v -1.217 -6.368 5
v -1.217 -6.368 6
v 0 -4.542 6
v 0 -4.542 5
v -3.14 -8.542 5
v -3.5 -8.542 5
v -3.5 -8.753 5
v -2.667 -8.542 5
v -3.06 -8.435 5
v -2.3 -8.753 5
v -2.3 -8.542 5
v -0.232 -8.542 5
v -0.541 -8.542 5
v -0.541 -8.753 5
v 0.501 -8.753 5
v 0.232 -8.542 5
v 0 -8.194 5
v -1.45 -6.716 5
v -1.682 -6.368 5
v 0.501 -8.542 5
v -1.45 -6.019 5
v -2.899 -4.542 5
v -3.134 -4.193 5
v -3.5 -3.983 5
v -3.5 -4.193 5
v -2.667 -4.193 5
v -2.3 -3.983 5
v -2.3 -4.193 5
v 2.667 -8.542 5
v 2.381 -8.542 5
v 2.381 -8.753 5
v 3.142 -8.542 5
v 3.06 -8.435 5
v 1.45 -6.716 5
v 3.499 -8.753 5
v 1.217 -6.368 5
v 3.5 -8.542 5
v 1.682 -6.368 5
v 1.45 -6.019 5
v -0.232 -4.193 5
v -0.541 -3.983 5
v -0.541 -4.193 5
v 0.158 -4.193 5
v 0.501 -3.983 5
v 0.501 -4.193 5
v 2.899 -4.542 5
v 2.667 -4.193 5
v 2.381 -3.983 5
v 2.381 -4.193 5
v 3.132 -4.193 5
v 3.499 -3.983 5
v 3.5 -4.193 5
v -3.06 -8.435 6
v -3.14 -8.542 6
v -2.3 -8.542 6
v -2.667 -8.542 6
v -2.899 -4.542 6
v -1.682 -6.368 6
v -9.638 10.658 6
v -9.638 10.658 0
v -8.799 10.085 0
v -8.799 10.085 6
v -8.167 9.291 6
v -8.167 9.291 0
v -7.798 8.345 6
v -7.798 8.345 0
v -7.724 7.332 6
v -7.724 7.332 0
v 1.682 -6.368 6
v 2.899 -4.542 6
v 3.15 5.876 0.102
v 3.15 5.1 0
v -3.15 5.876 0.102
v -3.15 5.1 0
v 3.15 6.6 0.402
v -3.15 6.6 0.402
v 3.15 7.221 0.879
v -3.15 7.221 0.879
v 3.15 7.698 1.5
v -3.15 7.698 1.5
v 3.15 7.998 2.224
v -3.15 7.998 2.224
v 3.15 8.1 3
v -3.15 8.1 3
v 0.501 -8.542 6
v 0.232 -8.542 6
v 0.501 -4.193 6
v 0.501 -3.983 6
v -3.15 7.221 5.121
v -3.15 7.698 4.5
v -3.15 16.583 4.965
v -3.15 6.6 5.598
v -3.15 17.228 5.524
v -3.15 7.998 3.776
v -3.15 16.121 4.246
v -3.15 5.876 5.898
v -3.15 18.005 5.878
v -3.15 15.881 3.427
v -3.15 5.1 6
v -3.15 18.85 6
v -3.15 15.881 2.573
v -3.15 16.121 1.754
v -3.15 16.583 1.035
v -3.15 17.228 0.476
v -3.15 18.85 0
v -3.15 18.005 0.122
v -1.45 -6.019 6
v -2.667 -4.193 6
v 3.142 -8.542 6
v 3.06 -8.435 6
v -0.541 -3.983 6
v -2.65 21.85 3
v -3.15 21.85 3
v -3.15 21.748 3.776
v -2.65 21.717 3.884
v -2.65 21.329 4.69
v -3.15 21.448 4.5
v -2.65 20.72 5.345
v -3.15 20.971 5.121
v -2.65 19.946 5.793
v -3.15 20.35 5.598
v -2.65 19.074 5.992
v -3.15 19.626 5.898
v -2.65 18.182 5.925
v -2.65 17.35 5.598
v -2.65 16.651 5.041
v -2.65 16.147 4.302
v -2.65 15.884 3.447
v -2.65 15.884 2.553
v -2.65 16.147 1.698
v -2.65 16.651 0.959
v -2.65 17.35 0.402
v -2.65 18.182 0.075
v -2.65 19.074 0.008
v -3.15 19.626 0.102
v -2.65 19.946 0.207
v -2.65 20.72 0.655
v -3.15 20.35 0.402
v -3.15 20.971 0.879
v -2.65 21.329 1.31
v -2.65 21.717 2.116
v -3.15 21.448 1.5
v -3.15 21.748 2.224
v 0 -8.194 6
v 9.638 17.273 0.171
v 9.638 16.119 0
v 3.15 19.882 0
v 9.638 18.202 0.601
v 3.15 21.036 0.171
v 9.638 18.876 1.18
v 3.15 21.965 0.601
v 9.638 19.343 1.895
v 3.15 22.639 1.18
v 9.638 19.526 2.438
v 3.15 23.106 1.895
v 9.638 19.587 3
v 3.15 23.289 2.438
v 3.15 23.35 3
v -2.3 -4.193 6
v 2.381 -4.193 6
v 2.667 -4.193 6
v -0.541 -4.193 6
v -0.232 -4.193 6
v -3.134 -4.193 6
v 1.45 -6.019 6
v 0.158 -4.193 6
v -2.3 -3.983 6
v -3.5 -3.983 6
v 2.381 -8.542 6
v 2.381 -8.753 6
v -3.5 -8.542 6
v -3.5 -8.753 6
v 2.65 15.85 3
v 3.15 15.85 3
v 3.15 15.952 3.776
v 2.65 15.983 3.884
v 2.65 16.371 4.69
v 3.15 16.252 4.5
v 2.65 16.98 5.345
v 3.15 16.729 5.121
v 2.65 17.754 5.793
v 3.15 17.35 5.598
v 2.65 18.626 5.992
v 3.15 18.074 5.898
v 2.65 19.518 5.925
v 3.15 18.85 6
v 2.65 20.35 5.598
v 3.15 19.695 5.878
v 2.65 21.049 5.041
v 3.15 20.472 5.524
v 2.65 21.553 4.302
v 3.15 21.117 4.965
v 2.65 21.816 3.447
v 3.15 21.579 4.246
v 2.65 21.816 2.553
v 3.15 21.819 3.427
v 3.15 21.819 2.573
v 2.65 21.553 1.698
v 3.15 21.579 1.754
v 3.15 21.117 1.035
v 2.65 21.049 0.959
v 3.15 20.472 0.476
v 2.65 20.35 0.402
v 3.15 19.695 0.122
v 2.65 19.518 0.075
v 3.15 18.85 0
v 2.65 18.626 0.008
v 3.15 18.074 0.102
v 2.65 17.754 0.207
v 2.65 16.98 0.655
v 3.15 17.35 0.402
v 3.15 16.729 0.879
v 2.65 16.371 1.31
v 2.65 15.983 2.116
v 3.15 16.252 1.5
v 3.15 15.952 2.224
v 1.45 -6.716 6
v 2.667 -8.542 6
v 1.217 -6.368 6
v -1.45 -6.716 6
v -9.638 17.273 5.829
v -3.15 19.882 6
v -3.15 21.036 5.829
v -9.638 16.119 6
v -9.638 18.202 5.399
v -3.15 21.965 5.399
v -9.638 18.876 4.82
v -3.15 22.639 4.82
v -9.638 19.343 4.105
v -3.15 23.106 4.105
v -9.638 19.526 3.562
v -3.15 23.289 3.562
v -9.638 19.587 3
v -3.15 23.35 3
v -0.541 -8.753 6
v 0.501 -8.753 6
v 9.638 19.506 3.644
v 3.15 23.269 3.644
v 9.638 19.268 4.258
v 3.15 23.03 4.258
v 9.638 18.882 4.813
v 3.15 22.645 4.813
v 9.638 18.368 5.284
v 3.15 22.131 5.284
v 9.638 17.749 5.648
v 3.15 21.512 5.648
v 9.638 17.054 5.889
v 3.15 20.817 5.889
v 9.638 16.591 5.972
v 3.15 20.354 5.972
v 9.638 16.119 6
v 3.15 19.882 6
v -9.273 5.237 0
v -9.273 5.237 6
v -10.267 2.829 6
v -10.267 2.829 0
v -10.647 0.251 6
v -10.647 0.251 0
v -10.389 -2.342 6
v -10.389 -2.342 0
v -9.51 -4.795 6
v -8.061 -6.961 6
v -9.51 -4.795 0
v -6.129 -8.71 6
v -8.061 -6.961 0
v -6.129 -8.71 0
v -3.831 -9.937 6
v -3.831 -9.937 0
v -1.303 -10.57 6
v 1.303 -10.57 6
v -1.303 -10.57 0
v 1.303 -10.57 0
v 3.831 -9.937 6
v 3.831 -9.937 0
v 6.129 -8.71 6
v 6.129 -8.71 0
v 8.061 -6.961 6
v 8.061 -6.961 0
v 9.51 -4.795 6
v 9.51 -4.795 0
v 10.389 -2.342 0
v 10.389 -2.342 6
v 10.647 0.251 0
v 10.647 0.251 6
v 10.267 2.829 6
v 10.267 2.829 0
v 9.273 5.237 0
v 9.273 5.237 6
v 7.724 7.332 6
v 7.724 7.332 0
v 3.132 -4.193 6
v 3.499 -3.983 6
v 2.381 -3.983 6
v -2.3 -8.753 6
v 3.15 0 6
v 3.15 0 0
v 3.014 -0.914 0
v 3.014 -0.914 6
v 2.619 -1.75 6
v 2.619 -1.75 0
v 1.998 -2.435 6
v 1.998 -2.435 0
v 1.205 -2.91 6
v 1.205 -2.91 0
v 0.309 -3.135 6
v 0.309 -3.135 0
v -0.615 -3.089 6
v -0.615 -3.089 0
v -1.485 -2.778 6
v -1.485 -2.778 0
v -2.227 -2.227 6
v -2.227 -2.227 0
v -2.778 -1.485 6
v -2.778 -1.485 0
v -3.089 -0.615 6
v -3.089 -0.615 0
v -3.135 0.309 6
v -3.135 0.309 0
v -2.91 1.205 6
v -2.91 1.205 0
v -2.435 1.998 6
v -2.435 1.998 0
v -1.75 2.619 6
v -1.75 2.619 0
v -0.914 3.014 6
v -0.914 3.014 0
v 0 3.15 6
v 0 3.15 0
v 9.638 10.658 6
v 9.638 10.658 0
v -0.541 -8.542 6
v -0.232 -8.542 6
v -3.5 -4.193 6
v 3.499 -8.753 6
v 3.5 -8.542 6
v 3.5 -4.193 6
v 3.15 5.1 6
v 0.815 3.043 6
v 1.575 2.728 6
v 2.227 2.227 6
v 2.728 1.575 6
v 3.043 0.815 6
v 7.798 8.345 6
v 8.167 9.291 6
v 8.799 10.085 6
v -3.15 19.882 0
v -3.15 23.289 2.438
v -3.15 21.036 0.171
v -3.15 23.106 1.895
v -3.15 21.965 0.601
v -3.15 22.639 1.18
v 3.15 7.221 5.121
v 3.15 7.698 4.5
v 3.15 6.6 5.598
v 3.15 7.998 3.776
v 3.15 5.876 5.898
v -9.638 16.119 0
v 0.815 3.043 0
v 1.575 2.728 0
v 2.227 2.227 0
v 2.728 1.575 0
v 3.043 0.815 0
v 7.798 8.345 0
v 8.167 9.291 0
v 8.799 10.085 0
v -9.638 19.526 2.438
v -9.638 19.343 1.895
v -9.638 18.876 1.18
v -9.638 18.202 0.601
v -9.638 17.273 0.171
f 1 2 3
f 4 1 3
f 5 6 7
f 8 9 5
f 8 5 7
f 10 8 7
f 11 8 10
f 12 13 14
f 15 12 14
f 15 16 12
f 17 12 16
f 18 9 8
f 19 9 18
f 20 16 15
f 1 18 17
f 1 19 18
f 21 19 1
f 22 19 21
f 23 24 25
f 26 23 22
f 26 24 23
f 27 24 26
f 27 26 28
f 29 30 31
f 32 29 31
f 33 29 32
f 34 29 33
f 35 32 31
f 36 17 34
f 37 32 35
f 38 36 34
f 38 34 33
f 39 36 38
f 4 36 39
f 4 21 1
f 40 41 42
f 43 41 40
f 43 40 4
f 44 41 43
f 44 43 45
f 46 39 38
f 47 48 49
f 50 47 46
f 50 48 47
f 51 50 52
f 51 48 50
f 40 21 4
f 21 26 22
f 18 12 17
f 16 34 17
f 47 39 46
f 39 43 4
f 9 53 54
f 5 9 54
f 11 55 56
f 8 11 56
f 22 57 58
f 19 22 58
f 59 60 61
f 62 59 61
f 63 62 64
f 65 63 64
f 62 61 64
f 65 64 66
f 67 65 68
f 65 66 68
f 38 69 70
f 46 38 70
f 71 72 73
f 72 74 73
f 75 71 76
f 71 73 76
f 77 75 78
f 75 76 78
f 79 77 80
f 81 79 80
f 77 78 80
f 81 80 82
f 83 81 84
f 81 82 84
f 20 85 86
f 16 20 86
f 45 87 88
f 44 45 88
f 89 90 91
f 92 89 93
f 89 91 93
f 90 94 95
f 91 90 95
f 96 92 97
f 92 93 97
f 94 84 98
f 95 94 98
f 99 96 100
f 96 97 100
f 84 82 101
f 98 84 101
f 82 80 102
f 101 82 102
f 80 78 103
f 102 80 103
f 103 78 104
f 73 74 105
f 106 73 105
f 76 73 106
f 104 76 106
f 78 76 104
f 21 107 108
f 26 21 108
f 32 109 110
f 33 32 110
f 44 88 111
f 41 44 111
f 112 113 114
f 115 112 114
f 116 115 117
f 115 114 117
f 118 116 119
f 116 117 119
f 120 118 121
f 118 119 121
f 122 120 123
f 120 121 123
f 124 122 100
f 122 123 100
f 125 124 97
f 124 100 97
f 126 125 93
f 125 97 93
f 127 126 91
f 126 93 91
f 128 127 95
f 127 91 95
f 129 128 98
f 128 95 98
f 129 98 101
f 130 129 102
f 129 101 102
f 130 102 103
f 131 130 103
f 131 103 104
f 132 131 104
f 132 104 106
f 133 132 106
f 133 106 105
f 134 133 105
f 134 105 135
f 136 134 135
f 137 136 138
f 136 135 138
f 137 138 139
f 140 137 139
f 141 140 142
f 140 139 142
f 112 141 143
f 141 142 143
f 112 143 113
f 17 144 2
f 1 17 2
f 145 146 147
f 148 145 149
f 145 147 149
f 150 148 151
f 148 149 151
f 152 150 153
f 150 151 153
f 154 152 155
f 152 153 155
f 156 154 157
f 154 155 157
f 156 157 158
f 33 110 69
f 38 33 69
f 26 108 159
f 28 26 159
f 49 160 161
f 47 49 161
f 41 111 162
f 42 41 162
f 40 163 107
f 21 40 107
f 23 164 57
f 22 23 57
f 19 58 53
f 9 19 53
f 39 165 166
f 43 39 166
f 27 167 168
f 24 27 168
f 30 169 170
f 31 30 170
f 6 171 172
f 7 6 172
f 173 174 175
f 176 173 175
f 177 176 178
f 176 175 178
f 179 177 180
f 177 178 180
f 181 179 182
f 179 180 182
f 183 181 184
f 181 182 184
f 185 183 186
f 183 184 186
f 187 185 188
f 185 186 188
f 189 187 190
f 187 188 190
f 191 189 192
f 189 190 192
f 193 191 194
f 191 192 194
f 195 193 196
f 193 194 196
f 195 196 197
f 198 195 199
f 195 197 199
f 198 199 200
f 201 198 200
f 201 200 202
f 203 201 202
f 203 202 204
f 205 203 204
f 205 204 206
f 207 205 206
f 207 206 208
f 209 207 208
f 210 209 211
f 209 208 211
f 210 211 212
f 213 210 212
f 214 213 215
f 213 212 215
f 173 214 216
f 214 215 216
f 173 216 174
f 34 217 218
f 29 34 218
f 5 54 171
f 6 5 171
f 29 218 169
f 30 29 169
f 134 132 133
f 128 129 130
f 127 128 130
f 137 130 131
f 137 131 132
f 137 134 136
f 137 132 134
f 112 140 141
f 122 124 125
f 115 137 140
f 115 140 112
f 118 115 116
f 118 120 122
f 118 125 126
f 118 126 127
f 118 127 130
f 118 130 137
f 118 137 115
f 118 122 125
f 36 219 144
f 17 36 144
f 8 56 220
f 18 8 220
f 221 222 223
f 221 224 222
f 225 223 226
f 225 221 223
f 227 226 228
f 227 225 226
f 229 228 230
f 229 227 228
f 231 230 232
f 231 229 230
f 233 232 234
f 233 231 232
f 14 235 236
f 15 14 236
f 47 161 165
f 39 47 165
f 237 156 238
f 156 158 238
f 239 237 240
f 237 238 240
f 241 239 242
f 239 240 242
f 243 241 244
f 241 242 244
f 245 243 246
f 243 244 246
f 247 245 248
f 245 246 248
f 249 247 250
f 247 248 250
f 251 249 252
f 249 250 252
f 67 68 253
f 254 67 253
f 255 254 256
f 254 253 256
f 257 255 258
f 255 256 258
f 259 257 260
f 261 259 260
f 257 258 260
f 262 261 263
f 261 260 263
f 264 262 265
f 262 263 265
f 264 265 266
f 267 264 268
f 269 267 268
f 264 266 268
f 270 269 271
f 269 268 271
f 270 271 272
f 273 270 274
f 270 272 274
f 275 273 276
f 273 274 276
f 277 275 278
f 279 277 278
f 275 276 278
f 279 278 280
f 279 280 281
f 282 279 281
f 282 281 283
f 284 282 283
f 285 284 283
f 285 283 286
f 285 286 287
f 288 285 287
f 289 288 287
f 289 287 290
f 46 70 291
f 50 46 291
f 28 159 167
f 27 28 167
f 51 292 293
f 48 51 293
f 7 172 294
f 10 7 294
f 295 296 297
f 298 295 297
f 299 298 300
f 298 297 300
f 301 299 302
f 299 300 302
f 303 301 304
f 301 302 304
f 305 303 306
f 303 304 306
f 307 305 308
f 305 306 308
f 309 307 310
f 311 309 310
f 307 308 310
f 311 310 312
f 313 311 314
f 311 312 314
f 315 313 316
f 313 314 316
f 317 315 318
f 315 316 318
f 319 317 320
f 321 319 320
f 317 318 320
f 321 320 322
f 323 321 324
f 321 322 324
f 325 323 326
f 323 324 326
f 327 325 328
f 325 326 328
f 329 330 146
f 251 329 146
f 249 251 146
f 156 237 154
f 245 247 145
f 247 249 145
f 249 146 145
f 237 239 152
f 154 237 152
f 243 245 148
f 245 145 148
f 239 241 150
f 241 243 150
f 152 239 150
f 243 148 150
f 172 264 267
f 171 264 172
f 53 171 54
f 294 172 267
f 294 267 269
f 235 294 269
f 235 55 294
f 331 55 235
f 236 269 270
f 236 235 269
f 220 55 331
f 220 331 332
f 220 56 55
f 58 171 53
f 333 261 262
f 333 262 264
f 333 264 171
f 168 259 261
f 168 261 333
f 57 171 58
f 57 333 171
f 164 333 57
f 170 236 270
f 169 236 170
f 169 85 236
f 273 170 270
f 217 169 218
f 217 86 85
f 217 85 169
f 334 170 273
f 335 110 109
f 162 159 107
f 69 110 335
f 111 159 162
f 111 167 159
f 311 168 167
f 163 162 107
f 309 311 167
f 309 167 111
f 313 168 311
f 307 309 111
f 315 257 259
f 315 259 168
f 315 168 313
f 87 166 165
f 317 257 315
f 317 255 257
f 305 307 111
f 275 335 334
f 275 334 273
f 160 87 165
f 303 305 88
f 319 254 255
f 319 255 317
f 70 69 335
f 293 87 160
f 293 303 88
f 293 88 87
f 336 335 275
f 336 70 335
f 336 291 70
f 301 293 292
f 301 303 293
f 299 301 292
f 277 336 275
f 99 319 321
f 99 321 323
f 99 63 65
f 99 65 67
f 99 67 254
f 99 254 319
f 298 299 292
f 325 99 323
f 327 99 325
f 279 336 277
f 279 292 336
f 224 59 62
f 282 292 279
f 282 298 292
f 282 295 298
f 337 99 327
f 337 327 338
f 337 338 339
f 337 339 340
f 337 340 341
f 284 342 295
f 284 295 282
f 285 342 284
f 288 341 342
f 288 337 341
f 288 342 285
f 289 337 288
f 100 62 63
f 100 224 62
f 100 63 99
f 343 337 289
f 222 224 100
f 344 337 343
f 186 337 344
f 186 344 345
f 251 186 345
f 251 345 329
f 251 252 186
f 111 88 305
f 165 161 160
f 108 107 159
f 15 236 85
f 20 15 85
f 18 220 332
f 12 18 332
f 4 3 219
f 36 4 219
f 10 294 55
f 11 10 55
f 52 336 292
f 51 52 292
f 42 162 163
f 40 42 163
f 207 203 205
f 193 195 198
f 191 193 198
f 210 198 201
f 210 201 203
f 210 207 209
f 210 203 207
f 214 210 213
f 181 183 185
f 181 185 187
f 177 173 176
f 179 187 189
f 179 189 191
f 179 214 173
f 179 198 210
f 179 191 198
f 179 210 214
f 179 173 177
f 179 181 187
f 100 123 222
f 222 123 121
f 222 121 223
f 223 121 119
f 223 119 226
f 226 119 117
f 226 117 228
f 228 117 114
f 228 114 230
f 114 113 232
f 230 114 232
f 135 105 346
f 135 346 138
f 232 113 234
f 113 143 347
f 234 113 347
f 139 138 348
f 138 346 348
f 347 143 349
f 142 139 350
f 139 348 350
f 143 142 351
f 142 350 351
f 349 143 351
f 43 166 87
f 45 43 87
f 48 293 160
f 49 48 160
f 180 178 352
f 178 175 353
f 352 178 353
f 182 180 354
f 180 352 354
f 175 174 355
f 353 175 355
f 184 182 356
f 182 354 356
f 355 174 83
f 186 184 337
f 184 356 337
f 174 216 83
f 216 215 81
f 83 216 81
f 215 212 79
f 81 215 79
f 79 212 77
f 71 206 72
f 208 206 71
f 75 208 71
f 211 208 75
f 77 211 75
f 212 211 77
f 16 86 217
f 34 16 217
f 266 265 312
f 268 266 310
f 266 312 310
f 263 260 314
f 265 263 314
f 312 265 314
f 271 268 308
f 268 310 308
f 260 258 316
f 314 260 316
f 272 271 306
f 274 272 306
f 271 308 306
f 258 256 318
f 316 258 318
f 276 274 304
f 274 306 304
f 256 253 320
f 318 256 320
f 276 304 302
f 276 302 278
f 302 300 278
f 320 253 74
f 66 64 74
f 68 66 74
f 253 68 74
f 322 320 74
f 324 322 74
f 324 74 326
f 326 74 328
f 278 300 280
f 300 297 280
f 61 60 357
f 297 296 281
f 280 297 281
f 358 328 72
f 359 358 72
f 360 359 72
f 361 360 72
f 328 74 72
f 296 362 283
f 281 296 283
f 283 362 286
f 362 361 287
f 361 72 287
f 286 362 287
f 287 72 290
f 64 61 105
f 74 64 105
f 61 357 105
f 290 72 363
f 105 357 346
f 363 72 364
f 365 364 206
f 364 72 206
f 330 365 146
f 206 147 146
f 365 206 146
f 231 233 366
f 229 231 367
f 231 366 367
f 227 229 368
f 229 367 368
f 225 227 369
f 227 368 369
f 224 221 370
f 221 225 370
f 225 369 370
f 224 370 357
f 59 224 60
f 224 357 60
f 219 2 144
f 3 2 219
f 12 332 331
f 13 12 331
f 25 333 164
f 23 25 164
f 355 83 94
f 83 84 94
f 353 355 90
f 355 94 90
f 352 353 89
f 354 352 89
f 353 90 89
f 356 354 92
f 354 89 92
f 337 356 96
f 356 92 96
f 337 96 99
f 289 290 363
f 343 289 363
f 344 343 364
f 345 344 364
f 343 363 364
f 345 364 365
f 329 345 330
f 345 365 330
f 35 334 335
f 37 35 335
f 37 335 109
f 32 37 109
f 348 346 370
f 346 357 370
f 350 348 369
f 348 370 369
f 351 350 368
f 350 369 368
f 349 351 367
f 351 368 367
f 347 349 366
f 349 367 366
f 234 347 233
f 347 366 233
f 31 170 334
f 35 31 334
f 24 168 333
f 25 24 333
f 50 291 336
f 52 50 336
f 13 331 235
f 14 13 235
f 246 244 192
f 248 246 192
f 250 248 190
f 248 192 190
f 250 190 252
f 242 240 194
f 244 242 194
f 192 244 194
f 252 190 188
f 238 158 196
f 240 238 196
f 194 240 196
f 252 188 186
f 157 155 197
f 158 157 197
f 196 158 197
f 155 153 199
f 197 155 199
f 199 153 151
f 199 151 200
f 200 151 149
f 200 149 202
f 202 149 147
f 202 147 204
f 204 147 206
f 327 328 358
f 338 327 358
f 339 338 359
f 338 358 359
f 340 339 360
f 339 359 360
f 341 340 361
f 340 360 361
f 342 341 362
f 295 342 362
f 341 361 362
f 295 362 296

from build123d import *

# Parameters (mm, degrees)
F1_DEPTH = 6
F2_R     = 3
F3_DEPTH = 0.5
F4_R     = 3
F5_DEPTH = 0.5
F6_R     = 2.99999
F7_R     = 2.99999
F9_DEPTH = 1
F10_R    = 3
F11_R    = 2.99999


# Not quite as in the source:
# - a fillet or chamfer is up to 0.001 mm smaller than in the source, because OpenCascade refuses the exact size


with BuildPart() as f1:
    # F0 (on Top) → F1 (new body)
    with BuildSketch(Plane.XY):
        with BuildLine():
            Line((-3.15, 8.1), (-3.15, 10.1734949747))
            ThreePointArc((-3.15, 10.1734949747), (-5.6194604457, 9.046776459), (-7.7238904562, 7.3323949854))
            ThreePointArc((-7.7238904562, 7.3323949854), (0, -10.65), (7.7238904562, 7.3323949854))
            ThreePointArc((7.7238904562, 7.3323949854), (5.6194604457, 9.046776459), (3.15, 10.1734949747))
            Line((3.15, 10.1734949747), (3.15, 8.1))
            Line((3.15, 8.1), (0, 8.1))
            Line((0, 8.1), (-3.15, 8.1))
        make_face()
        with BuildLine():
            ThreePointArc((3.15, 0), (-2.2273863607, -2.2273863607), (0, 3.15))
            ThreePointArc((0, 3.15), (2.2273863607, 2.2273863607), (3.15, 0))
        make_face(mode=Mode.SUBTRACT)
        with BuildLine():
            ThreePointArc((-7.7238904562, 7.3323949854), (-5.6194604457, 9.046776459), (-3.15, 10.1734949747))
            Line((-3.15, 10.1734949747), (-3.15, 23.35))
            Line((-3.15, 23.35), (-9.6377339195, 19.5871143267))
            Line((-9.6377339195, 19.5871143267), (-9.6377339195, 10.6575252249))
            ThreePointArc((-9.6377339195, 10.6575252249), (-8.1670066914, 9.2906908645), (-7.7238904562, 7.3323949854))
        make_face()
        with BuildLine():
            ThreePointArc((3.15, 10.1734949747), (5.6194604457, 9.046776459), (7.7238904562, 7.3323949854))
            ThreePointArc((7.7238904562, 7.3323949854), (8.1670066914, 9.2906908645), (9.6377339195, 10.6575252249))
            Line((9.6377339195, 10.6575252249), (9.6377339195, 19.5871143267))
            Line((9.6377339195, 19.5871143267), (3.15, 23.35))
            Line((3.15, 23.35), (3.15, 10.1734949747))
        make_face()
    extrude(amount=F1_DEPTH)

    # F2 (on face) → F3 (join)
    with BuildSketch(Plane.YZ.offset(-3.15)):
        with Locations((18.85, 3)):
            Circle(F2_R)
    extrude(amount=F3_DEPTH)

    # F4 (on face) → F5 (join)
    with BuildSketch(Plane(origin=(3.15, 0, 0), x_dir=(0, -1, 0), z_dir=(-1, 0, 0))):
        with Locations((-18.85, 3)):
            Circle(F4_R)
    extrude(amount=F5_DEPTH)

    # F6 (radius 3 in the source; OpenCascade refuses exactly that, so slightly less here)
    f6_edges = [f1.edges().sort_by_distance(p)[0] for p in [
        (-6.393867, 21.468557, 0),
        (-6.393867, 21.468557, 6),
    ]]
    fillet(f6_edges, radius=F6_R)

    # F7 (radius 3 in the source; OpenCascade refuses exactly that, so slightly less here)
    f7_edges = [f1.edges().sort_by_distance(p)[0] for p in [
        (6.393867, 21.468557, 0),
        (6.393867, 21.468557, 6),
    ]]
    fillet(f7_edges, radius=F7_R)

    # F8 (on face) → F9 (cut)
    with BuildSketch(Plane.XY.offset(6)):
        Polygon((-0.5410675658, -4.1934514275), (-0.2322952287, -4.1934514275), (-1.4496098506, -6.0194233604), (-2.6669244725, -4.1934514275), (-2.3, -4.1934514275), (-2.3, -3.9827399887), (-3.5, -3.9827399887), (-3.5, -4.1934514275), (-3.1341812573, -4.1934514275), (-2.8992197012, -4.5418942706), (-1.6819050793, -6.3678662034), (-3.0600394749, -8.4350677969), (-3.1399389263, -8.5422809794), (-3.5, -8.5422809794), (-3.5, -8.7529924182), (-2.3, -8.7529924182), (-2.3, -8.5422809794), (-2.6669244725, -8.5422809794), (-1.4496098506, -6.7163090465), (-0.2322952287, -8.5422809794), (-0.5410675658, -8.5422809794), (-0.5410675658, -8.7529924182), (0.5013382179, -8.7529924182), (0.5013382179, -8.5422809794), (0.2322952287, -8.5422809794), (1.4496098506, -6.7163090465), (2.6669244725, -8.5422809794), (2.3810260464, -8.5422809794), (2.3810260464, -8.7529924182), (3.4986780956, -8.7529924182), (3.5, -8.5422809794), (3.1424169429, -8.5422809794), (3.0600394749, -8.4350677969), (1.6819050793, -6.3678662034), (2.8992197012, -4.5418942706), (3.1315149299, -4.1934514275), (3.3579636365, -4.1934514275), (3.5, -4.1934514275), (3.4986780956, -3.9827399887), (2.3810260464, -3.9827399887), (2.3810260464, -4.1934514275), (2.6669244725, -4.1934514275), (1.4496098506, -6.0194233604), (0.1581401168, -4.1934514275), (0.5013382179, -4.1934514275), (0.5013382179, -3.9827399887), (-0.5410675658, -3.9827399887), align=None)
        Polygon((-1.2173146219, -6.3678662034), (0, -4.5418942706), (1.2173146219, -6.3678662034), (0, -8.1938381363), align=None, mode=Mode.SUBTRACT)
    extrude(amount=-F9_DEPTH, mode=Mode.SUBTRACT)

    # F10
    f10_edges = [f1.edges().sort_by_distance(p)[0] for p in [
        (0, 8.1, 6),
    ]]
    fillet(f10_edges, radius=F10_R)

    # F11 (radius 3 in the source; OpenCascade refuses exactly that, so slightly less here)
    f11_edges = [f1.edges().sort_by_distance(p)[0] for p in [
        (0, 8.1, 0),
    ]]
    fillet(f11_edges, radius=F11_R)


solid = f1.part
